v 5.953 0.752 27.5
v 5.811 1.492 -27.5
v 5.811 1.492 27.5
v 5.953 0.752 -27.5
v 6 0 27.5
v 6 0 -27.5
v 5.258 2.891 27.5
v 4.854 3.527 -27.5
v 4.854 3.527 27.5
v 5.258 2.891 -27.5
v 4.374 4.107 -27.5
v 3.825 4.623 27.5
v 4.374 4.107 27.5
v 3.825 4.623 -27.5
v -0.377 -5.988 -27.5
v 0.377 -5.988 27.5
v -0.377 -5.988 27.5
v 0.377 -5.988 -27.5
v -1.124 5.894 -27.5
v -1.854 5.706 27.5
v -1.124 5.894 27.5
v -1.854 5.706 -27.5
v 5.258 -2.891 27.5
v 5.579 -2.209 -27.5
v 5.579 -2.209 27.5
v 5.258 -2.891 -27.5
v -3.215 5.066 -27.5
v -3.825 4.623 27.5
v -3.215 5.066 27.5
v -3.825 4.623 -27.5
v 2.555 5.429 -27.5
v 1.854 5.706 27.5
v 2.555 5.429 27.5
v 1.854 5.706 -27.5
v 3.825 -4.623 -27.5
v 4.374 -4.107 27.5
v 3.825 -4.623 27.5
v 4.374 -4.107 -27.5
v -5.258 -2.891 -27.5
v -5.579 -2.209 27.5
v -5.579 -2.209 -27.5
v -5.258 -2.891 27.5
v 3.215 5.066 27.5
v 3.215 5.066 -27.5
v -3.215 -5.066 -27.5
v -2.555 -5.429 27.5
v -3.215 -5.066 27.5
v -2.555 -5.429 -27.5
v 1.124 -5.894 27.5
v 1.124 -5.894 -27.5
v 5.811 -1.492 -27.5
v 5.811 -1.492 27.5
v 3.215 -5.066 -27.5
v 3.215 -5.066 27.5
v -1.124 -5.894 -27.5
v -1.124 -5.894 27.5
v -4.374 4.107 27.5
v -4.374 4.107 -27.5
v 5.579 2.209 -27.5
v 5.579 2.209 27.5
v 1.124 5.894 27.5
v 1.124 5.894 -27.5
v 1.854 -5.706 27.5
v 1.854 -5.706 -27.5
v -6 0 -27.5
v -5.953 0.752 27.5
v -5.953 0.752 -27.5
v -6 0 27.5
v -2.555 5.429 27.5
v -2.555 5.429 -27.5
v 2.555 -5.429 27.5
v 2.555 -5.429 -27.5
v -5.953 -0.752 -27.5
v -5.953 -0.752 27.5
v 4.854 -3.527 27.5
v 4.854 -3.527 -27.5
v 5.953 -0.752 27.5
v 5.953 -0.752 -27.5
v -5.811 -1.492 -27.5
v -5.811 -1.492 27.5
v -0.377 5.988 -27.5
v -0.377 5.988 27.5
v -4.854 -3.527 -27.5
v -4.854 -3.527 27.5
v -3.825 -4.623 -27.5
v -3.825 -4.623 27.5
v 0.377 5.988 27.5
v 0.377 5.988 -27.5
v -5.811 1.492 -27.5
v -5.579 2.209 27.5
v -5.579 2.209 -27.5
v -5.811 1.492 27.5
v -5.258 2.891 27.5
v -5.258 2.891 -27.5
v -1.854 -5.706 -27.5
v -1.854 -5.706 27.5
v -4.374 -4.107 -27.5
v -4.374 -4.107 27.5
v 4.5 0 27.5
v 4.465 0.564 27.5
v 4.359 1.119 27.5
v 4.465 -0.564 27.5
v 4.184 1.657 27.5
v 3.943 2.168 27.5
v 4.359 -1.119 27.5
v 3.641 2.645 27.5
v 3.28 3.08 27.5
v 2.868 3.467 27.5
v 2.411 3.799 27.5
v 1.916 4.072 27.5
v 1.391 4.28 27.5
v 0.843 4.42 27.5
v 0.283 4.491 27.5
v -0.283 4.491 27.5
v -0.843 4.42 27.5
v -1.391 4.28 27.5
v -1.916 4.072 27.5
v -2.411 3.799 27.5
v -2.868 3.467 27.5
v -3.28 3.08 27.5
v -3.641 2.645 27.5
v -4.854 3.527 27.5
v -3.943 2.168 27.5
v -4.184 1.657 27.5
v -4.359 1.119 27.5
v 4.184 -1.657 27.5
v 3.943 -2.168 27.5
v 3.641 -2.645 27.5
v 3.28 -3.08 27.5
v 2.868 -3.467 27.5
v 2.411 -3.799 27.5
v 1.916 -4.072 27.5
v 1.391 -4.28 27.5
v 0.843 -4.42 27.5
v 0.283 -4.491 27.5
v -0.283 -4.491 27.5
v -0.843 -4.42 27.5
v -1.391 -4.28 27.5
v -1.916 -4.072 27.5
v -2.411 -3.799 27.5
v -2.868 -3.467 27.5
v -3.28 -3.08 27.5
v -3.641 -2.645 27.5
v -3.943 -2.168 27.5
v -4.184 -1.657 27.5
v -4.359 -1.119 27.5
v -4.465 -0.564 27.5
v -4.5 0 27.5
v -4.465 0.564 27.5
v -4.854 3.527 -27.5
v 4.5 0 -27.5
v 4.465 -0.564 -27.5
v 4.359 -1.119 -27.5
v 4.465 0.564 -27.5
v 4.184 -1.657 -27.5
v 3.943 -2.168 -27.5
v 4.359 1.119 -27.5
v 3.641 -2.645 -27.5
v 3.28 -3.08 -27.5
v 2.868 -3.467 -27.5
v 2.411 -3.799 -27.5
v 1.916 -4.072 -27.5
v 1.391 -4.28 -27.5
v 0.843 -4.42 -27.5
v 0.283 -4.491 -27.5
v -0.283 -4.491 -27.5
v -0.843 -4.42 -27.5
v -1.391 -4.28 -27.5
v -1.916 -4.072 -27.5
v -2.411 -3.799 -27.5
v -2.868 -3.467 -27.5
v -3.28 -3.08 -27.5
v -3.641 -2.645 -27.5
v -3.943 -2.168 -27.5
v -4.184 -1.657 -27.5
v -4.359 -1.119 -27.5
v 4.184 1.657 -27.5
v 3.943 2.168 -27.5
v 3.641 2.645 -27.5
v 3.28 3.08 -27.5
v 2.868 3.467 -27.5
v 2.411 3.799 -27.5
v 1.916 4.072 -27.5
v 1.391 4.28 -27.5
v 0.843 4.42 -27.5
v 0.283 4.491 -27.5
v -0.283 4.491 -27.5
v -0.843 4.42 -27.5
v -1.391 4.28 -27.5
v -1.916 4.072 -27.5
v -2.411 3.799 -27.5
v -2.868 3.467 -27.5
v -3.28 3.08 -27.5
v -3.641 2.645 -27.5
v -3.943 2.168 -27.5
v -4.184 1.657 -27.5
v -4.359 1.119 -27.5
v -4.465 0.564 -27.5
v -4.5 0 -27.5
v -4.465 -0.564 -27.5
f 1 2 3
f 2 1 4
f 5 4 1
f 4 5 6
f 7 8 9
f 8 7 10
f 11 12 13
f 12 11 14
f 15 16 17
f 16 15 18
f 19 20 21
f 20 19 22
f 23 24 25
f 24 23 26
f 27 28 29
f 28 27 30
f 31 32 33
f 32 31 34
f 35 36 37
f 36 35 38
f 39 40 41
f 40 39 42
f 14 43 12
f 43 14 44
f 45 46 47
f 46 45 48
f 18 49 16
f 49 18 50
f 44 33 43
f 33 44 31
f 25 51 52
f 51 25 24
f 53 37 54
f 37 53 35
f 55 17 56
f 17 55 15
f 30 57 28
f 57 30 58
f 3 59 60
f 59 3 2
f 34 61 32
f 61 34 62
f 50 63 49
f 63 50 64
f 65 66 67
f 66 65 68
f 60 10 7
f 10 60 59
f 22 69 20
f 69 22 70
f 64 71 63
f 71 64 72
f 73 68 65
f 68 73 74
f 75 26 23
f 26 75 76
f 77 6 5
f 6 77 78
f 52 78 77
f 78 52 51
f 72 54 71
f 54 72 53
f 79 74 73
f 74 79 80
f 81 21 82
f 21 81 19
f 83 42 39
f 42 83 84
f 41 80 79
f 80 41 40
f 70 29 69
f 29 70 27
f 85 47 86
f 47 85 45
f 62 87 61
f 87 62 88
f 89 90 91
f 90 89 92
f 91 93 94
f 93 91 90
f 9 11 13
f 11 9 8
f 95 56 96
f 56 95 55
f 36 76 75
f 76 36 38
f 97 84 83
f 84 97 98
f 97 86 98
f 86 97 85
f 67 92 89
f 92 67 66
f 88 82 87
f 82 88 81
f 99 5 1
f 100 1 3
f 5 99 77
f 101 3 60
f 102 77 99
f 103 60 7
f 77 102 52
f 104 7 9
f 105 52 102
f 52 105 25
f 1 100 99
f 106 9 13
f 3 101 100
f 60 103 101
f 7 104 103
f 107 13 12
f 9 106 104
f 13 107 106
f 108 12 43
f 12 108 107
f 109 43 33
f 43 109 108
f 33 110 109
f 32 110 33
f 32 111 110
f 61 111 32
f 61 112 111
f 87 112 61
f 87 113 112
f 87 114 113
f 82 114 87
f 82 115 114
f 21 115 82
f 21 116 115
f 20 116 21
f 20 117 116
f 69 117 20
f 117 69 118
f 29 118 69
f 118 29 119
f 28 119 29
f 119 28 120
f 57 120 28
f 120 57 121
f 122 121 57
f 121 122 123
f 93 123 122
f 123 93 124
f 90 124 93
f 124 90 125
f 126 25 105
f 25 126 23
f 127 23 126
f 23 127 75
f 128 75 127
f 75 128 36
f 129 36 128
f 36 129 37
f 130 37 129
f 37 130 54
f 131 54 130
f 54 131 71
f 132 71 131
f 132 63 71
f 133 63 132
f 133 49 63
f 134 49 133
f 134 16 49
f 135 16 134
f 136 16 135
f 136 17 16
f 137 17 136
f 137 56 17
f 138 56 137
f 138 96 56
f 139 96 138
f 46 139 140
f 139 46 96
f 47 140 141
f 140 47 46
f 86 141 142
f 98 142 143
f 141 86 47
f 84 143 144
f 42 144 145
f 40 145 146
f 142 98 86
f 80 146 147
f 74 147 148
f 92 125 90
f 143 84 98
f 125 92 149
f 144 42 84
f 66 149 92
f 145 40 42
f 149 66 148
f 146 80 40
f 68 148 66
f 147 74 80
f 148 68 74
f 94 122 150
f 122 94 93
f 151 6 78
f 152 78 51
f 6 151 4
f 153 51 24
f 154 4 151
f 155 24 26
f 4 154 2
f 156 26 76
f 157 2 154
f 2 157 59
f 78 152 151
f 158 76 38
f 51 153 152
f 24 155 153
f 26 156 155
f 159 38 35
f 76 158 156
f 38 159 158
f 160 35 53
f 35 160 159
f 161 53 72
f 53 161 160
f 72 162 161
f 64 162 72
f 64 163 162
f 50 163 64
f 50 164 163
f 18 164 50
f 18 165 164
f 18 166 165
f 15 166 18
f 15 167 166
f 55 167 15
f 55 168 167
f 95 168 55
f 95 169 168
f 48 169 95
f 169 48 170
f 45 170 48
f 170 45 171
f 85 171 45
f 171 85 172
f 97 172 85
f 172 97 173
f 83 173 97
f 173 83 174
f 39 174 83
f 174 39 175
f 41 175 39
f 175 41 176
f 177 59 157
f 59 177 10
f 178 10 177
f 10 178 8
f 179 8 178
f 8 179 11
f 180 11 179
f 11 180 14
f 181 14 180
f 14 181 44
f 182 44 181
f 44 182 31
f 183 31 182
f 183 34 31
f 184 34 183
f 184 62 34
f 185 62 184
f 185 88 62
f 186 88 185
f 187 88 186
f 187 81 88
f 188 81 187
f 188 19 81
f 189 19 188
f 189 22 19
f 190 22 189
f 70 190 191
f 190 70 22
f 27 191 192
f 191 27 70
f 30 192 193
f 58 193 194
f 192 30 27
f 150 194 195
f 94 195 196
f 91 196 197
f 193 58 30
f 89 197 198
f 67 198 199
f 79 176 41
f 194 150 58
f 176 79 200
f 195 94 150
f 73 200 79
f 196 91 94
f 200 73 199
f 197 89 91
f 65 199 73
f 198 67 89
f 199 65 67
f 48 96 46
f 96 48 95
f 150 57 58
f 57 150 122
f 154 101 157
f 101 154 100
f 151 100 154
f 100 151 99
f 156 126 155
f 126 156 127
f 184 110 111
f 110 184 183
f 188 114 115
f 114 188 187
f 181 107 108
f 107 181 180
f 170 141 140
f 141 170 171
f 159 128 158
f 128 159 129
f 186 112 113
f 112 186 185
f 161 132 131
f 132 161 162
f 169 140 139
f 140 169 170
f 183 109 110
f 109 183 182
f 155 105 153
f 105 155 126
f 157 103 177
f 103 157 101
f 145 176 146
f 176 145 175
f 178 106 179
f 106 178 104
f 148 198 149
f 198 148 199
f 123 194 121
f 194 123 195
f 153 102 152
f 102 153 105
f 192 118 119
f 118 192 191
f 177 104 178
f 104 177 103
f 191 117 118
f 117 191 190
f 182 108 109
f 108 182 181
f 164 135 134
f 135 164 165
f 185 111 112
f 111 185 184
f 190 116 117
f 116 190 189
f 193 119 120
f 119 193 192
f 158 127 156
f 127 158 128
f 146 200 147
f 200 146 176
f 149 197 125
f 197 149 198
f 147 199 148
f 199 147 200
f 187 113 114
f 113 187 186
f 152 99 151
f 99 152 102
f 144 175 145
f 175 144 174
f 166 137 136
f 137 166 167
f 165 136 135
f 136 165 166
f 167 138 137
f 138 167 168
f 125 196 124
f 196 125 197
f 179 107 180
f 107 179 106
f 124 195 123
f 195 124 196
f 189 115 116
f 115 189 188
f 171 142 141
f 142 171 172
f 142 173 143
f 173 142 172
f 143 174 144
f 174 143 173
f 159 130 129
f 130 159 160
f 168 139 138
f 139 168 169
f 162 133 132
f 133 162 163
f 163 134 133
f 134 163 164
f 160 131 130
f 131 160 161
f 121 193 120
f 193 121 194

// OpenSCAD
$fn = 50;


difference() {
	union() {
		translate(v = [0, 0, -27.5000000000]) {
			cylinder(h = 55, r = 6.0000000000);
		}
	}
	union() {
		translate(v = [0, 0, -100.0000000000]) {
			cylinder(h = 200, r = 4.5000000000);
		}
	}
}
